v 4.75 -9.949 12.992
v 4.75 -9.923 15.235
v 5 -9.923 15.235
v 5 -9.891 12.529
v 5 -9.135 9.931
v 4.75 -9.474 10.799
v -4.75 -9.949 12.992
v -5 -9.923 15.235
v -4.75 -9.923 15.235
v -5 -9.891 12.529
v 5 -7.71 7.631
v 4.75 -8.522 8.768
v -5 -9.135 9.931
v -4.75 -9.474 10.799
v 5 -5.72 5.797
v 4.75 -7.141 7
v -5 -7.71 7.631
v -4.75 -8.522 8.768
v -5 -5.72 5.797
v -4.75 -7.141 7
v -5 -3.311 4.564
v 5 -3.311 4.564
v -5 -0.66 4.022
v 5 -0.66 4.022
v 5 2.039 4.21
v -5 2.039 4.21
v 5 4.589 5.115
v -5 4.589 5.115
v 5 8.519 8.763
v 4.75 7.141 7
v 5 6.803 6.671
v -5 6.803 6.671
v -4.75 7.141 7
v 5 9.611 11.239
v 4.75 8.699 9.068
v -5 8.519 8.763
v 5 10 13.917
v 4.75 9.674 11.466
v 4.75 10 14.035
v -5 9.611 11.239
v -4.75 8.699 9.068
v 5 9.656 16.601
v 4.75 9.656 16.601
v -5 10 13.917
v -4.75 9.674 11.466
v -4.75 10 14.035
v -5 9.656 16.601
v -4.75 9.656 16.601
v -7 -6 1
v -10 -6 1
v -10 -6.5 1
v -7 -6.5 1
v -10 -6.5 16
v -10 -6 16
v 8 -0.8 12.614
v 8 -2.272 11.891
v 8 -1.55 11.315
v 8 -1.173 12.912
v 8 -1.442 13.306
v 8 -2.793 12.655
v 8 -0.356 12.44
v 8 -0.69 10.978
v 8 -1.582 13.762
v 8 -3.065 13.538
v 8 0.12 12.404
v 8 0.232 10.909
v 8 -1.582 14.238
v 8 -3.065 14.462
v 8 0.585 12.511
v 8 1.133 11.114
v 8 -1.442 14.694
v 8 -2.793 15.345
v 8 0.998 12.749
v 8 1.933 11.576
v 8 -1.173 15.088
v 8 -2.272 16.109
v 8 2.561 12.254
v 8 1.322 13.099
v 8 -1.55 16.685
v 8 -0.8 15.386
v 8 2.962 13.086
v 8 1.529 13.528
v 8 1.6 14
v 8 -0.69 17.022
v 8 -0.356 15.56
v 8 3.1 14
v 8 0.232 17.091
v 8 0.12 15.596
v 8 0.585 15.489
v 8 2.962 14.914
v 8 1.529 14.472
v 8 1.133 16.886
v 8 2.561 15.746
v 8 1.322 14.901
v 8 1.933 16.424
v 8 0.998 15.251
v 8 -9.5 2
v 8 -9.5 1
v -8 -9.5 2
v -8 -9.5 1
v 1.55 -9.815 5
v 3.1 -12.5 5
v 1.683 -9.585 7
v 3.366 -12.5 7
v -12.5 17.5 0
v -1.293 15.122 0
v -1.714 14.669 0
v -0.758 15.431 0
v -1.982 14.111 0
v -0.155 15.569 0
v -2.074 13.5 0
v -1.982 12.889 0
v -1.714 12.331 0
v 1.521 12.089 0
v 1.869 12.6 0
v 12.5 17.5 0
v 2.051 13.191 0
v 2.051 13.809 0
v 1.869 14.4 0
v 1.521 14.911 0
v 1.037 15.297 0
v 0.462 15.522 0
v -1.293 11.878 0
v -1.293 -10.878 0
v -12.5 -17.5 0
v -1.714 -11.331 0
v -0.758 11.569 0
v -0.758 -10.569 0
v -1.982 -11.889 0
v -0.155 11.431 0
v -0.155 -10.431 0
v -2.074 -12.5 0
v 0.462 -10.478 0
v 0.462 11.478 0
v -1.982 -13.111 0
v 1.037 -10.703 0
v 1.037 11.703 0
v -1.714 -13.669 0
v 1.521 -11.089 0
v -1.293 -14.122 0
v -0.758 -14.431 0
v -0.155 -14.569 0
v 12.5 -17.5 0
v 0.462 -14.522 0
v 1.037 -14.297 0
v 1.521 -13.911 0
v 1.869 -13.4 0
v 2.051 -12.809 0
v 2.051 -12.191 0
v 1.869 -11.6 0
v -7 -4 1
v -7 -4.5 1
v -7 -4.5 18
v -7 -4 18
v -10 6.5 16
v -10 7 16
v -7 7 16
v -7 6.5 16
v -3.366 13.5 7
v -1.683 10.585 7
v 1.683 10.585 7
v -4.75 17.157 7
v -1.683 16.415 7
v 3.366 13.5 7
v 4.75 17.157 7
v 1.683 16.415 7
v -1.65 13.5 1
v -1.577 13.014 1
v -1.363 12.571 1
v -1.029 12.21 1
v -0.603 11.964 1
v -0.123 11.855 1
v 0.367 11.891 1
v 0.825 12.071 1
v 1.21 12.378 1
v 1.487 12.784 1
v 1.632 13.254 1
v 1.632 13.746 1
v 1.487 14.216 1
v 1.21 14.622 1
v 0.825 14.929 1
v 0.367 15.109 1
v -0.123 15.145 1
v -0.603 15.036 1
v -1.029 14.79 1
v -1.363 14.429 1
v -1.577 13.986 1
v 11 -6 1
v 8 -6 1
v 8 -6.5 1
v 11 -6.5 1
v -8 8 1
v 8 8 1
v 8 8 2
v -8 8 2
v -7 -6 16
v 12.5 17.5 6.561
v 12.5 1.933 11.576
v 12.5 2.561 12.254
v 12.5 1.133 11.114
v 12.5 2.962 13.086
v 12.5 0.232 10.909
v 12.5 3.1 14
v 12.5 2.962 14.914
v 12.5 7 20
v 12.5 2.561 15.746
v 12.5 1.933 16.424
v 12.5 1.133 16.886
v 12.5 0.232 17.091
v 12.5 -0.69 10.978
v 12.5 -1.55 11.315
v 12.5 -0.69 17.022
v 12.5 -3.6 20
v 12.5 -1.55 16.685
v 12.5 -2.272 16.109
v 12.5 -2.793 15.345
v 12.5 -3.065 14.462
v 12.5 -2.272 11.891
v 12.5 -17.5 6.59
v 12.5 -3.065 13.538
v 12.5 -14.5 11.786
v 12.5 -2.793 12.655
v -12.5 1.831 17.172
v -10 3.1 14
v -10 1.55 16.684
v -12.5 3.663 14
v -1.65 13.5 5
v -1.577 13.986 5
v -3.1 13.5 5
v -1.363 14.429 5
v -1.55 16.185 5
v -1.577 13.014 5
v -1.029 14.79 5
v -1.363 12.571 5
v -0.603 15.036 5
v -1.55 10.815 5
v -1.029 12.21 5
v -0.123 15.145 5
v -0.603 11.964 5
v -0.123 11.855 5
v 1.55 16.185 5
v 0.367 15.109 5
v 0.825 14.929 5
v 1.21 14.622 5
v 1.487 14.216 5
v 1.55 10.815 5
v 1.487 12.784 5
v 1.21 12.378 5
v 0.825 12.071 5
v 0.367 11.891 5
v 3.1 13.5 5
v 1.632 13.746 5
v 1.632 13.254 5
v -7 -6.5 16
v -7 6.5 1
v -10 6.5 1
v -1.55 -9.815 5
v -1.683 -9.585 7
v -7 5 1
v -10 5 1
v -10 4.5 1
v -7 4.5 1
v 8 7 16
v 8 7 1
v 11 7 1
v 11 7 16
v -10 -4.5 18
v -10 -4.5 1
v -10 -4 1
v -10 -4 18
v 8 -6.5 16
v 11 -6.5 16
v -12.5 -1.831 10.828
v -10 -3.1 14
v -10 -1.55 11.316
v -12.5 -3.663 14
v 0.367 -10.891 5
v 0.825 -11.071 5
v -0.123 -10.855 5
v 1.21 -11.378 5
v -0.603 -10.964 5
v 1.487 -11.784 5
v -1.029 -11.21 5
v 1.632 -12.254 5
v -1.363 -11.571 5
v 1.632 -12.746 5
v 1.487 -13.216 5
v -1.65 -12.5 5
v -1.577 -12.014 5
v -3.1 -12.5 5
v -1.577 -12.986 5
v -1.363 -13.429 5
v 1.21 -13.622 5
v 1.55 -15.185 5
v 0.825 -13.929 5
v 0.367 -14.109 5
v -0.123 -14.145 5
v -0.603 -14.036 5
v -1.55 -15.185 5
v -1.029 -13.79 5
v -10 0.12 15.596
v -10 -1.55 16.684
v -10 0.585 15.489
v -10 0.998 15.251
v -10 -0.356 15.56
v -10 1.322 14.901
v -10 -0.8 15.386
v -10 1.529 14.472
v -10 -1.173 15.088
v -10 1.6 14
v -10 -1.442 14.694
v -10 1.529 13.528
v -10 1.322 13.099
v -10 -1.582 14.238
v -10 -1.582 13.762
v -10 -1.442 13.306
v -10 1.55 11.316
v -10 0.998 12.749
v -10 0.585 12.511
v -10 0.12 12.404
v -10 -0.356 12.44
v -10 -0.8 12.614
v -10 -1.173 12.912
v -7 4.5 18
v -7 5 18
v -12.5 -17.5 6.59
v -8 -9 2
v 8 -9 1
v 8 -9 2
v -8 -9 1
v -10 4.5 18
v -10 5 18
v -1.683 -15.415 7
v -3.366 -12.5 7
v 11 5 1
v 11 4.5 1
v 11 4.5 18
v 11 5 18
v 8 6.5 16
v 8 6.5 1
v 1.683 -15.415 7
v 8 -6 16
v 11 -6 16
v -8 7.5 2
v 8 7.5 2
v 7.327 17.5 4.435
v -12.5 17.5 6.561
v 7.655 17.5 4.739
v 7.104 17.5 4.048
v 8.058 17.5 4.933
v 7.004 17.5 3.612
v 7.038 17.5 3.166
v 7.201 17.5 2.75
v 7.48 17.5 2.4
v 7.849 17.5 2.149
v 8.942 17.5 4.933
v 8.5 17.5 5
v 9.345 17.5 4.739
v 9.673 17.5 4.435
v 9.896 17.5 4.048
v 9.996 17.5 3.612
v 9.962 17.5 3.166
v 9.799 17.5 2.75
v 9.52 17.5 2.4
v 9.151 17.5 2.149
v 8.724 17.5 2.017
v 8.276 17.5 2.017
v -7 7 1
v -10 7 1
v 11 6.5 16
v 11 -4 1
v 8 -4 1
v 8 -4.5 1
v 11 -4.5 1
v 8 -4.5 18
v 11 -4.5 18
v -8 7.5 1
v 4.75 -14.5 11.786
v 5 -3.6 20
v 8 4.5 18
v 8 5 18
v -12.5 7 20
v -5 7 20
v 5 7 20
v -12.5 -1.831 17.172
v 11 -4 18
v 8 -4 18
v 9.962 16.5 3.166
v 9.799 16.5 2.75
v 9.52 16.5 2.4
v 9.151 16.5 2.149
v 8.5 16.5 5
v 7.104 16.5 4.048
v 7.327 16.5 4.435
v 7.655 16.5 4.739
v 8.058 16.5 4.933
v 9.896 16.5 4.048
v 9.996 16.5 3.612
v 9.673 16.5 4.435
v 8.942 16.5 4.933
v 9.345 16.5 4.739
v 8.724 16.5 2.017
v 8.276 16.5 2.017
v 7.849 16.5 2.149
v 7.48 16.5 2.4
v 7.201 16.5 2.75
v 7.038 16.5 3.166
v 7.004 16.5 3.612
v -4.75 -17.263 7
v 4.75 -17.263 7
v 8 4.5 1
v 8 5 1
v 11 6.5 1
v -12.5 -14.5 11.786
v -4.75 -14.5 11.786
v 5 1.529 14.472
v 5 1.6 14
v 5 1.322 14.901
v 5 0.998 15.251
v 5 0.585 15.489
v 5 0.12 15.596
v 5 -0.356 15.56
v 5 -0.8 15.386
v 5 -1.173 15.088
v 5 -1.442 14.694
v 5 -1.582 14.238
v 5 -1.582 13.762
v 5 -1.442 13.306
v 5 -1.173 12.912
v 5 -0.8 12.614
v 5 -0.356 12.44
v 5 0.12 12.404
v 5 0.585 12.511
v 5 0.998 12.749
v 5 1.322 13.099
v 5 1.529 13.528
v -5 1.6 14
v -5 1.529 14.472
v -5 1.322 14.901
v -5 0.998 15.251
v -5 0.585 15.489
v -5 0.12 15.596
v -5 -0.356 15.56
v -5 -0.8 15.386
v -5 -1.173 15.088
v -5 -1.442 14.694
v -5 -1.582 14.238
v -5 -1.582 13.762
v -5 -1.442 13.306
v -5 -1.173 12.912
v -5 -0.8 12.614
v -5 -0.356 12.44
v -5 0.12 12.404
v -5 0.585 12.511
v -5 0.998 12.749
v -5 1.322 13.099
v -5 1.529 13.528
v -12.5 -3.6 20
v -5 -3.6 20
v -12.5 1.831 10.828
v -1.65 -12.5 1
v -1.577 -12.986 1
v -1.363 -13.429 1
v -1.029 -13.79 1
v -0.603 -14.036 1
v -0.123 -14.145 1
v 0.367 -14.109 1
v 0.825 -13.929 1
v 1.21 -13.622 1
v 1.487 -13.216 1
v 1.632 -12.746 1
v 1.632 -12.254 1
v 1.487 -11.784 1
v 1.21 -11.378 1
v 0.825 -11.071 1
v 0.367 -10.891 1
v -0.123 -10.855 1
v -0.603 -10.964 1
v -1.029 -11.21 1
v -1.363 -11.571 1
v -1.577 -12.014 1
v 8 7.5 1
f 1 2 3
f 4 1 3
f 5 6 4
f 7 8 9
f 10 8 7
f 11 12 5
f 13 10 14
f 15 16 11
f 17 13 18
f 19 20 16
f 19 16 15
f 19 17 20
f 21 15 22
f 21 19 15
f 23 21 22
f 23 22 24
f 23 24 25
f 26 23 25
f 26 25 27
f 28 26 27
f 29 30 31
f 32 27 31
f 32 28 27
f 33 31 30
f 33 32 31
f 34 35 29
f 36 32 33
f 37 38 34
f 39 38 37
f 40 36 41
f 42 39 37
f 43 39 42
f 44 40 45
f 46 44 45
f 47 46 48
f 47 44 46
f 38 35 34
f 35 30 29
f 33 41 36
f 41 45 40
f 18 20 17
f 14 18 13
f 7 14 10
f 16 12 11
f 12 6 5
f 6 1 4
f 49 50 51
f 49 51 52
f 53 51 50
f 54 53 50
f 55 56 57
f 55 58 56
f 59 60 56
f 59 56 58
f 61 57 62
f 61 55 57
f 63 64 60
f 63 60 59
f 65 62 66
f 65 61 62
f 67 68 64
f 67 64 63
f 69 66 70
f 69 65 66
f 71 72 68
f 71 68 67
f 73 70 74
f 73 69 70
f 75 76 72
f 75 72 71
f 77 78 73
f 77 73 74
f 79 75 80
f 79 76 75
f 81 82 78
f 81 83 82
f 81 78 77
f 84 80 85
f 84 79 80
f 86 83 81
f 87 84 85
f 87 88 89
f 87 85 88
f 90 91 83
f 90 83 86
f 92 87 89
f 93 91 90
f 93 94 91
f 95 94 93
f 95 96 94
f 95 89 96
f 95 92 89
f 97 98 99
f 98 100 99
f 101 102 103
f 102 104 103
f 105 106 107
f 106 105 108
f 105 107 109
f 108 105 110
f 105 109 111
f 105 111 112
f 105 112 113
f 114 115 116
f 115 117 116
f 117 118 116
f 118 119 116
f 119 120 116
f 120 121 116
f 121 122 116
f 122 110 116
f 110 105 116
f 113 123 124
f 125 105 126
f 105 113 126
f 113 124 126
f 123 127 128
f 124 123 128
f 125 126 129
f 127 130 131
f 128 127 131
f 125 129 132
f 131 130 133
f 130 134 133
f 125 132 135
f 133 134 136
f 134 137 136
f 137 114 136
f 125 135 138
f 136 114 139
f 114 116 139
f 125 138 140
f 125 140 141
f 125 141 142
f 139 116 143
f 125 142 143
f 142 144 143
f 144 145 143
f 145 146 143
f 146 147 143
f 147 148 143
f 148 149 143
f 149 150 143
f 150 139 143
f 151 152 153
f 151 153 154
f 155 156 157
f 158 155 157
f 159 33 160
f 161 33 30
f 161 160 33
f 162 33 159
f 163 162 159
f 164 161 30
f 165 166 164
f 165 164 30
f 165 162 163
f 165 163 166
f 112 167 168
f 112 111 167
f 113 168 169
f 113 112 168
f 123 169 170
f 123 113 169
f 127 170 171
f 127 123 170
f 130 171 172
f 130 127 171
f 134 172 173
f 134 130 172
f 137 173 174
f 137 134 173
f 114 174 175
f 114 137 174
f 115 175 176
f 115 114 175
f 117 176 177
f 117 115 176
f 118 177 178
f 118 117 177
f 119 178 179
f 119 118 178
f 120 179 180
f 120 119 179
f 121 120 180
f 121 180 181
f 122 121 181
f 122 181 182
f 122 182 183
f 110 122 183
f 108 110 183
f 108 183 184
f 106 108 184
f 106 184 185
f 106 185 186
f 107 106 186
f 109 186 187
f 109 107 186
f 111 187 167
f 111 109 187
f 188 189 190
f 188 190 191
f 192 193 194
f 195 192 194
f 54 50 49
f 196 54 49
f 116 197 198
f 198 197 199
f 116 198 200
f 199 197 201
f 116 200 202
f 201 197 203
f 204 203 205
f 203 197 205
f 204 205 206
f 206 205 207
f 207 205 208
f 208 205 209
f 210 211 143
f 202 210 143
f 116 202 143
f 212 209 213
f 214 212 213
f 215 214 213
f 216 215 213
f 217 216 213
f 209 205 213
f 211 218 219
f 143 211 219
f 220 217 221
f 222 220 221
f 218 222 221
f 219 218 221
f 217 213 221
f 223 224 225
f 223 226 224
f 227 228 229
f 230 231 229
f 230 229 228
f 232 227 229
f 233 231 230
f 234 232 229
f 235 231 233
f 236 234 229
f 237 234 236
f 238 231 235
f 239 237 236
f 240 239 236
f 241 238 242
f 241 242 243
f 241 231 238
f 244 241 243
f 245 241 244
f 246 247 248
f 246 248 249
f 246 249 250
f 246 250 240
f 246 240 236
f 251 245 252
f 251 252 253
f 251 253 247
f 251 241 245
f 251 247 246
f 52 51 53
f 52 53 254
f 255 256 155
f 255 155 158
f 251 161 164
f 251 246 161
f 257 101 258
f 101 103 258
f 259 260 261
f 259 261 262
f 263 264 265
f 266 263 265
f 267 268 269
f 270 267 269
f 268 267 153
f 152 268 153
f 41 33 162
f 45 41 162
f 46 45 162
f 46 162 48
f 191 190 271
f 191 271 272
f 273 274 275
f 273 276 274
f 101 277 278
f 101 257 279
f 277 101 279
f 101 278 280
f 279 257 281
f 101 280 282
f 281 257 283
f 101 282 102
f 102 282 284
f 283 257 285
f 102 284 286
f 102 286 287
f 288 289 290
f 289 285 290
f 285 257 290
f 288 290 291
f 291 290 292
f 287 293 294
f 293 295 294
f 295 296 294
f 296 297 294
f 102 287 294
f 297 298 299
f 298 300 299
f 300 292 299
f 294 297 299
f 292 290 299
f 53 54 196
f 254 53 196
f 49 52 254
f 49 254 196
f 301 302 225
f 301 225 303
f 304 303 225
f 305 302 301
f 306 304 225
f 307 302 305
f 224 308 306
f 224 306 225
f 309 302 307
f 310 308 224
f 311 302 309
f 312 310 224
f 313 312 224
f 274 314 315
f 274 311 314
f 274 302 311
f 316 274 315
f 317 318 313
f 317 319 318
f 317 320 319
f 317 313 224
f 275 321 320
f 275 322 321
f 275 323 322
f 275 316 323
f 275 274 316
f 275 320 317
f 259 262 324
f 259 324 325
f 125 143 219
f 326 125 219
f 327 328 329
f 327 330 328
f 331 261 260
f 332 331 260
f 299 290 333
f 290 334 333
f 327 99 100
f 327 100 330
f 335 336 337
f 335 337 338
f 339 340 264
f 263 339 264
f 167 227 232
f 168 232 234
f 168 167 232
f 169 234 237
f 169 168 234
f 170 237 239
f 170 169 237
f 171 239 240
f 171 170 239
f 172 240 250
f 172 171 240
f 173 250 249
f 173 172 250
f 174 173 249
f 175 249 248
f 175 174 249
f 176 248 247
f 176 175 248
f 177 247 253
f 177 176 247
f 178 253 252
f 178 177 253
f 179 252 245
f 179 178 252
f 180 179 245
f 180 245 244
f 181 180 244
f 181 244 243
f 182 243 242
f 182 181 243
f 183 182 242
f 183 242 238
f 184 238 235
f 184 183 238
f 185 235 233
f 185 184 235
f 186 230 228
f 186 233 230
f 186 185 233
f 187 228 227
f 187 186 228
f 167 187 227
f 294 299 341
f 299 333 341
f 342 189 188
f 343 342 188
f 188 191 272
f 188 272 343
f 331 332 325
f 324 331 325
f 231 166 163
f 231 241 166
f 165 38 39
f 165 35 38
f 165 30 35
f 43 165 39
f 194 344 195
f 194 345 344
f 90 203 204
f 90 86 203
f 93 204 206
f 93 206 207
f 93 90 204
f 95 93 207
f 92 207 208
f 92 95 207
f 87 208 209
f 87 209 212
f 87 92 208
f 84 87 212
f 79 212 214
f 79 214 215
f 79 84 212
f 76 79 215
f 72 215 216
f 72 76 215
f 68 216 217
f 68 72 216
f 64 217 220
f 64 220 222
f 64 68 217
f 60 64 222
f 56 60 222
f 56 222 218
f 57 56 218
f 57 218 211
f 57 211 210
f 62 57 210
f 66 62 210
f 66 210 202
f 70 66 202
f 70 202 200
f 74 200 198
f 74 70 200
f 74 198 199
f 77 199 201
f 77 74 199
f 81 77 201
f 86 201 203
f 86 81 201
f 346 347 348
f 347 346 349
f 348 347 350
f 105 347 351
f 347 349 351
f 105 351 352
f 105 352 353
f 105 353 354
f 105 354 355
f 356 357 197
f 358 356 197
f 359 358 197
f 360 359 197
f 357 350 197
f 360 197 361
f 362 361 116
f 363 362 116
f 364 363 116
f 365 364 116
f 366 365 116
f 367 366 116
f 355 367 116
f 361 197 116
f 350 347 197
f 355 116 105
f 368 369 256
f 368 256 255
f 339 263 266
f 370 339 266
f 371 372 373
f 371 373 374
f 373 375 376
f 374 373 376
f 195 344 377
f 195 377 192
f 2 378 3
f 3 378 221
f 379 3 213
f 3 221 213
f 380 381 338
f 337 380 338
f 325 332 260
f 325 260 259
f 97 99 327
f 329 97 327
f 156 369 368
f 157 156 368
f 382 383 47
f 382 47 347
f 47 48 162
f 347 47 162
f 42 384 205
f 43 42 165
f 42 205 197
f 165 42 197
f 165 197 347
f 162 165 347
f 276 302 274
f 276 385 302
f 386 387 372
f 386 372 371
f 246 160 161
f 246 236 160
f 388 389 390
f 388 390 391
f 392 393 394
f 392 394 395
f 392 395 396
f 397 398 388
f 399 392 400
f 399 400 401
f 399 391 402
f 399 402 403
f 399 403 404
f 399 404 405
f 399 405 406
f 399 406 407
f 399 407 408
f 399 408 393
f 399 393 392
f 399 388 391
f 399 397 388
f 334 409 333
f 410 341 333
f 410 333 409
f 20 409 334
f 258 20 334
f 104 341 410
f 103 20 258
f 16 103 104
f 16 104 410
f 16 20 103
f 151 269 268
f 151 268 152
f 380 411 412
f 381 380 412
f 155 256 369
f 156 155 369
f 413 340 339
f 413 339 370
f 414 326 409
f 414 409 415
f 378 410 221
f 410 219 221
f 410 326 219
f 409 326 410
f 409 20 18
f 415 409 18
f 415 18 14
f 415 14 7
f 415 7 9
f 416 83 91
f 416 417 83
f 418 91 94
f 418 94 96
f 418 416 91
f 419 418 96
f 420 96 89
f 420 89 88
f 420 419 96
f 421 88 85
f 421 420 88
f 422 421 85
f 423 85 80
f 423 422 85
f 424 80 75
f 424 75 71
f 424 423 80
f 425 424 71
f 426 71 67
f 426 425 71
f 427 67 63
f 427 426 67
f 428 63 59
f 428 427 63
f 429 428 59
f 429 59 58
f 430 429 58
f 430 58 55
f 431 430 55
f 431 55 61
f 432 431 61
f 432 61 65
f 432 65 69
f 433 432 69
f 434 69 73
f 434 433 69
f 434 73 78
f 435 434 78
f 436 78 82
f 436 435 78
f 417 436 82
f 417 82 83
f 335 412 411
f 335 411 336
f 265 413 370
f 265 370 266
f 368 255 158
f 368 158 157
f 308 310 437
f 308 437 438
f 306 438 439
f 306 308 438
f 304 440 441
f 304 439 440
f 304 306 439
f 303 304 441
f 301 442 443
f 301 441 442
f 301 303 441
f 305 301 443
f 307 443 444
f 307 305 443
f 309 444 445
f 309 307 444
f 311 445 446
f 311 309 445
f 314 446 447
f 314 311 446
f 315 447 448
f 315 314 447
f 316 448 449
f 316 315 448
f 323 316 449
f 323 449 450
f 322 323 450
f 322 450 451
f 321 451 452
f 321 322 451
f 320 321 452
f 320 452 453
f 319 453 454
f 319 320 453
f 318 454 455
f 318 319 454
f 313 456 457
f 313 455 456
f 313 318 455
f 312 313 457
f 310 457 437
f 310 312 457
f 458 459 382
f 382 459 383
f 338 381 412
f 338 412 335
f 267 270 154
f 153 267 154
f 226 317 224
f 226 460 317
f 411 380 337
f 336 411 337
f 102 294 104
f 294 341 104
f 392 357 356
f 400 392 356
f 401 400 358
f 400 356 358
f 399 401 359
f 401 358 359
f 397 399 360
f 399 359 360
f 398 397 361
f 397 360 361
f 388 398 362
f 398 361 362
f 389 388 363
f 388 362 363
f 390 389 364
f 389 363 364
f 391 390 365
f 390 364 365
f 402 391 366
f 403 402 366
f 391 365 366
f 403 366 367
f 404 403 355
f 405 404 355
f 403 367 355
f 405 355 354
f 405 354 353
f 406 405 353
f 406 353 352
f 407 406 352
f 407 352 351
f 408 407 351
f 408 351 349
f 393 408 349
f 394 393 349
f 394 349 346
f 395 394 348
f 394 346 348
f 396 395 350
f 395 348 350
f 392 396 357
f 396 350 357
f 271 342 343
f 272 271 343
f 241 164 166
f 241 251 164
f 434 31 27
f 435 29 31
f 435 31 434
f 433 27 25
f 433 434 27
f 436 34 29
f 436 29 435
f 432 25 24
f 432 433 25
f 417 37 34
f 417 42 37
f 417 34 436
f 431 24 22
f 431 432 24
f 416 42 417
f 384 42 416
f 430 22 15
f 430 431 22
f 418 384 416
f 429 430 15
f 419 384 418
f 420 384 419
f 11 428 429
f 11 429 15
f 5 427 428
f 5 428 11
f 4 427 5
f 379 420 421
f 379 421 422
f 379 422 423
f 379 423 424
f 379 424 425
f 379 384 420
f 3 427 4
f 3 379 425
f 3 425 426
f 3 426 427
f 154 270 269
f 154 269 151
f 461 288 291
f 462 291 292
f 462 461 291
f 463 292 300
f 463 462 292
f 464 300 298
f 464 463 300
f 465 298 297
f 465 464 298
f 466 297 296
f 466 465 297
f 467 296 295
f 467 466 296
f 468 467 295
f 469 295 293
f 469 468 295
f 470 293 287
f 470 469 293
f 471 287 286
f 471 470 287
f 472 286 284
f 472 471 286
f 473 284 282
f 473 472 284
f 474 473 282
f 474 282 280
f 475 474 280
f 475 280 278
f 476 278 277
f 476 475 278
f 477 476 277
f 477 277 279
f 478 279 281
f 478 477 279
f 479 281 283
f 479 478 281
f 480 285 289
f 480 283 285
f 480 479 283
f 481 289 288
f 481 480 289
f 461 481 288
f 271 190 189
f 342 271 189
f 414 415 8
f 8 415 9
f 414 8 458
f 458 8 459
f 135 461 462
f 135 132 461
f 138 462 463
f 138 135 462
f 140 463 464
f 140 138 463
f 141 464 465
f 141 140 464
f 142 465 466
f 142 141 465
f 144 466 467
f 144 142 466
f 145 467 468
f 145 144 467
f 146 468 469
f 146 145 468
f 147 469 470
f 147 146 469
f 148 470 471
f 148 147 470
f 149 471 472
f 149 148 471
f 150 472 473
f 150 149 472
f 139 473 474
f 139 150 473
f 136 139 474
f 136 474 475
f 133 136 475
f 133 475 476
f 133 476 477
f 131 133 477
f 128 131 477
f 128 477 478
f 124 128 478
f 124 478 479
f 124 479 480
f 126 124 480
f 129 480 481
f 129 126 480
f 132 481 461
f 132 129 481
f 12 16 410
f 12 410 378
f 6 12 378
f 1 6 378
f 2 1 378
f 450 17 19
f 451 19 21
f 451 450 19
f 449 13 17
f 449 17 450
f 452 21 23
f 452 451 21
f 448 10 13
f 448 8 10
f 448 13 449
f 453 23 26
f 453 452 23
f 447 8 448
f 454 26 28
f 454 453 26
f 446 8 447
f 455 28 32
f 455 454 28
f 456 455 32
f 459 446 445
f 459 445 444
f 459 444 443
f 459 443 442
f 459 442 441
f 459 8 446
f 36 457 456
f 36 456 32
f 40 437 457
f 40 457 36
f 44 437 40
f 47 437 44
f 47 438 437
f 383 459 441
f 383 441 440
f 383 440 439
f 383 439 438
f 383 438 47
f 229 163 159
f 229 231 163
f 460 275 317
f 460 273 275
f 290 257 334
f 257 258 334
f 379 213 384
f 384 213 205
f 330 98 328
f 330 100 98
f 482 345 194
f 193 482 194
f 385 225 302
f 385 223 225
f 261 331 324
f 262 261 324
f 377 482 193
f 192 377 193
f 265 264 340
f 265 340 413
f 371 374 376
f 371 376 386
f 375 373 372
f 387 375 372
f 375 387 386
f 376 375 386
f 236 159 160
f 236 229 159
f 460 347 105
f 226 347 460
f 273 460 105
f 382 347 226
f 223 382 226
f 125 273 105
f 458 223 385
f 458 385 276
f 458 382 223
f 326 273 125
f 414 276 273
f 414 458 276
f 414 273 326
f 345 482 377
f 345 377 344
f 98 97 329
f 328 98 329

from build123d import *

# Parameters (mm, degrees)
SKETCH_R          = 1.6
PAD_DEPTH         = 12.5
SKETCH001_W       = 9.5
SKETCH001_H       = 14
POCKET_DEPTH      = 17.501
POCKET_DEPTH_BACK = -17.501
SKETCH011_R       = 1.5
POCKET001_DEPTH   = 1
SKETCH012_W       = 0.5
SKETCH012_H       = 1
POCKET002_DEPTH   = 8
SKETCH013_W       = 3
SKETCH013_H       = 0.5
POCKET003_DEPTH   = 17
SKETCH014_W       = 3
SKETCH014_H       = 0.5
POCKET004_DEPTH   = 15


with BuildPart() as part:
    # Sketch → Pad (new body, symmetric)
    with BuildSketch(Plane.YZ):
        Polygon((-17.5, 0), (-17.5, 6.590108), (-14.5, 11.786261), (-3.6, 20), (7, 20), (17.5, 6.560613), (17.5, 0), align=None)
        with Locations((0, 14)):
            Circle(SKETCH_R, mode=Mode.SUBTRACT)
    extrude(amount=PAD_DEPTH, both=True)

    # Sketch001 → Pocket (cut, two sides)
    with BuildSketch(Plane.XZ) as pocket_sk:
        with Locations((0, 14)):
            Rectangle(SKETCH001_W, SKETCH001_H)
    extrude(amount=-POCKET_DEPTH, mode=Mode.SUBTRACT)
    extrude(pocket_sk.sketch, amount=-POCKET_DEPTH_BACK, mode=Mode.SUBTRACT)

    # Sketch002 → Groove (revolve, cut)
    with BuildSketch(Plane.XY.offset(14)):
        Polygon((-5, 0), (12.5, 0), (12.5, 3.1), (8, 3.1), (8, 1.6), (5, 1.6), (5, 10), (-5, 10), align=None)
    revolve(axis=Axis((-5, 0, 14), (1, 0, 0)), mode=Mode.SUBTRACT)

    # Sketch004 → SubtractiveLoft section 0
    with BuildSketch(Plane.YZ.offset(-10)):
        Polygon((-1.549897, 16.6845), (-3.099794, 14), (-1.549897, 11.3155), (1.549897, 11.3155), (3.099794, 14), (1.549897, 16.6845), align=None)
    # Sketch003 → SubtractiveLoft section 1
    with BuildSketch(Plane.YZ.offset(-12.5)):
        Polygon((-3.66271, 14), (-1.831355, 10.828), (1.831355, 10.828), (3.66271, 14), (1.831355, 17.172), (-1.831355, 17.172), align=None)
    loft(mode=Mode.SUBTRACT)

    # Sketch006 → SubtractiveLoft001 section 0
    with BuildSketch(Plane.XY.offset(5)):
        Polygon((-1.550185, -9.815), (-3.100371, -12.5), (-1.550185, -15.185), (1.550185, -15.185), (3.100371, -12.5), (1.550185, -9.815), align=None)
    # Sketch005 → SubtractiveLoft001 section 1
    with BuildSketch(Plane.XY.offset(7)):
        Polygon((-1.682976, -9.585), (-3.365952, -12.5), (-1.682976, -15.415), (1.682976, -15.415), (3.365952, -12.5), (1.682976, -9.585), align=None)
    loft(mode=Mode.SUBTRACT)

    # Sketch007 → Groove001 (revolve, cut)
    with BuildSketch(Plane.XZ.offset(12.5)):
        Polygon((0, 7), (-1.65, 7), (-1.65, 1), (-2.074475, 0), (0, 0), align=None)
    revolve(axis=Axis((0, -12.5, 0), (0, 0, 1)), mode=Mode.SUBTRACT)

    # Sketch008 → SubtractiveLoft002 section 0
    with BuildSketch(Plane.XY.offset(7)):
        Polygon((-1.682976, 16.415), (-3.365952, 13.5), (-1.682976, 10.585), (1.682976, 10.585), (3.365952, 13.5), (1.682976, 16.415), align=None)
    # Sketch009 → SubtractiveLoft002 section 1
    with BuildSketch(Plane.XY.offset(5)):
        Polygon((-1.550185, 16.185), (-3.100371, 13.5), (-1.550185, 10.815), (1.550185, 10.815), (3.100371, 13.5), (1.550185, 16.185), align=None)
    loft(mode=Mode.SUBTRACT)

    # Sketch010 → Groove002 (revolve, cut)
    with BuildSketch(Plane.XZ.offset(-13.5)):
        Polygon((0, 7), (-1.65, 7), (-1.65, 1), (-2.074475, 0), (0, 0), align=None)
    revolve(axis=Axis((0, 13.5, 0), (0, 0, 1)), mode=Mode.SUBTRACT)

    # Sketch011 (on Face6 of Groove002) → Pocket001 (cut)
    with BuildSketch(Plane.ZX.offset(17.5)):
        with Locations((3.5, 8.5)):
            Circle(SKETCH011_R)
    extrude(amount=-POCKET001_DEPTH, mode=Mode.SUBTRACT)

    # Sketch012 → Pocket002 (cut, symmetric)
    with BuildSketch(Plane.YZ):
        with Locations((-9.25, 1.5)):
            Rectangle(SKETCH012_W, SKETCH012_H)
        with Locations((7.75, 1.5)):
            Rectangle(SKETCH012_W, SKETCH012_H)
    extrude(amount=POCKET002_DEPTH, both=True, mode=Mode.SUBTRACT)

    # Sketch013 → Pocket003 (cut)
    with BuildSketch(Plane.XY.offset(1)):
        with Locations((-8.5, 4.75)):
            Rectangle(SKETCH013_W, SKETCH013_H)
        with Locations((9.5, 4.75)):
            Rectangle(SKETCH013_W, SKETCH013_H)
        with Locations((9.5, -4.25)):
            Rectangle(SKETCH013_W, SKETCH013_H)
        with Locations((-8.5, -4.25)):
            Rectangle(SKETCH013_W, SKETCH013_H)
    extrude(amount=POCKET003_DEPTH, mode=Mode.SUBTRACT)

    # Sketch014 → Pocket004 (cut)
    with BuildSketch(Plane.XY.offset(1)):
        with Locations((-8.5, 6.75)):
            Rectangle(SKETCH014_W, SKETCH014_H)
        with Locations((9.5, 6.75)):
            Rectangle(SKETCH014_W, SKETCH014_H)
        with Locations((9.5, -6.25)):
            Rectangle(SKETCH014_W, SKETCH014_H)
        with Locations((-8.5, -6.25)):
            Rectangle(SKETCH014_W, SKETCH014_H)
    extrude(amount=POCKET004_DEPTH, mode=Mode.SUBTRACT)


solid = part.part
